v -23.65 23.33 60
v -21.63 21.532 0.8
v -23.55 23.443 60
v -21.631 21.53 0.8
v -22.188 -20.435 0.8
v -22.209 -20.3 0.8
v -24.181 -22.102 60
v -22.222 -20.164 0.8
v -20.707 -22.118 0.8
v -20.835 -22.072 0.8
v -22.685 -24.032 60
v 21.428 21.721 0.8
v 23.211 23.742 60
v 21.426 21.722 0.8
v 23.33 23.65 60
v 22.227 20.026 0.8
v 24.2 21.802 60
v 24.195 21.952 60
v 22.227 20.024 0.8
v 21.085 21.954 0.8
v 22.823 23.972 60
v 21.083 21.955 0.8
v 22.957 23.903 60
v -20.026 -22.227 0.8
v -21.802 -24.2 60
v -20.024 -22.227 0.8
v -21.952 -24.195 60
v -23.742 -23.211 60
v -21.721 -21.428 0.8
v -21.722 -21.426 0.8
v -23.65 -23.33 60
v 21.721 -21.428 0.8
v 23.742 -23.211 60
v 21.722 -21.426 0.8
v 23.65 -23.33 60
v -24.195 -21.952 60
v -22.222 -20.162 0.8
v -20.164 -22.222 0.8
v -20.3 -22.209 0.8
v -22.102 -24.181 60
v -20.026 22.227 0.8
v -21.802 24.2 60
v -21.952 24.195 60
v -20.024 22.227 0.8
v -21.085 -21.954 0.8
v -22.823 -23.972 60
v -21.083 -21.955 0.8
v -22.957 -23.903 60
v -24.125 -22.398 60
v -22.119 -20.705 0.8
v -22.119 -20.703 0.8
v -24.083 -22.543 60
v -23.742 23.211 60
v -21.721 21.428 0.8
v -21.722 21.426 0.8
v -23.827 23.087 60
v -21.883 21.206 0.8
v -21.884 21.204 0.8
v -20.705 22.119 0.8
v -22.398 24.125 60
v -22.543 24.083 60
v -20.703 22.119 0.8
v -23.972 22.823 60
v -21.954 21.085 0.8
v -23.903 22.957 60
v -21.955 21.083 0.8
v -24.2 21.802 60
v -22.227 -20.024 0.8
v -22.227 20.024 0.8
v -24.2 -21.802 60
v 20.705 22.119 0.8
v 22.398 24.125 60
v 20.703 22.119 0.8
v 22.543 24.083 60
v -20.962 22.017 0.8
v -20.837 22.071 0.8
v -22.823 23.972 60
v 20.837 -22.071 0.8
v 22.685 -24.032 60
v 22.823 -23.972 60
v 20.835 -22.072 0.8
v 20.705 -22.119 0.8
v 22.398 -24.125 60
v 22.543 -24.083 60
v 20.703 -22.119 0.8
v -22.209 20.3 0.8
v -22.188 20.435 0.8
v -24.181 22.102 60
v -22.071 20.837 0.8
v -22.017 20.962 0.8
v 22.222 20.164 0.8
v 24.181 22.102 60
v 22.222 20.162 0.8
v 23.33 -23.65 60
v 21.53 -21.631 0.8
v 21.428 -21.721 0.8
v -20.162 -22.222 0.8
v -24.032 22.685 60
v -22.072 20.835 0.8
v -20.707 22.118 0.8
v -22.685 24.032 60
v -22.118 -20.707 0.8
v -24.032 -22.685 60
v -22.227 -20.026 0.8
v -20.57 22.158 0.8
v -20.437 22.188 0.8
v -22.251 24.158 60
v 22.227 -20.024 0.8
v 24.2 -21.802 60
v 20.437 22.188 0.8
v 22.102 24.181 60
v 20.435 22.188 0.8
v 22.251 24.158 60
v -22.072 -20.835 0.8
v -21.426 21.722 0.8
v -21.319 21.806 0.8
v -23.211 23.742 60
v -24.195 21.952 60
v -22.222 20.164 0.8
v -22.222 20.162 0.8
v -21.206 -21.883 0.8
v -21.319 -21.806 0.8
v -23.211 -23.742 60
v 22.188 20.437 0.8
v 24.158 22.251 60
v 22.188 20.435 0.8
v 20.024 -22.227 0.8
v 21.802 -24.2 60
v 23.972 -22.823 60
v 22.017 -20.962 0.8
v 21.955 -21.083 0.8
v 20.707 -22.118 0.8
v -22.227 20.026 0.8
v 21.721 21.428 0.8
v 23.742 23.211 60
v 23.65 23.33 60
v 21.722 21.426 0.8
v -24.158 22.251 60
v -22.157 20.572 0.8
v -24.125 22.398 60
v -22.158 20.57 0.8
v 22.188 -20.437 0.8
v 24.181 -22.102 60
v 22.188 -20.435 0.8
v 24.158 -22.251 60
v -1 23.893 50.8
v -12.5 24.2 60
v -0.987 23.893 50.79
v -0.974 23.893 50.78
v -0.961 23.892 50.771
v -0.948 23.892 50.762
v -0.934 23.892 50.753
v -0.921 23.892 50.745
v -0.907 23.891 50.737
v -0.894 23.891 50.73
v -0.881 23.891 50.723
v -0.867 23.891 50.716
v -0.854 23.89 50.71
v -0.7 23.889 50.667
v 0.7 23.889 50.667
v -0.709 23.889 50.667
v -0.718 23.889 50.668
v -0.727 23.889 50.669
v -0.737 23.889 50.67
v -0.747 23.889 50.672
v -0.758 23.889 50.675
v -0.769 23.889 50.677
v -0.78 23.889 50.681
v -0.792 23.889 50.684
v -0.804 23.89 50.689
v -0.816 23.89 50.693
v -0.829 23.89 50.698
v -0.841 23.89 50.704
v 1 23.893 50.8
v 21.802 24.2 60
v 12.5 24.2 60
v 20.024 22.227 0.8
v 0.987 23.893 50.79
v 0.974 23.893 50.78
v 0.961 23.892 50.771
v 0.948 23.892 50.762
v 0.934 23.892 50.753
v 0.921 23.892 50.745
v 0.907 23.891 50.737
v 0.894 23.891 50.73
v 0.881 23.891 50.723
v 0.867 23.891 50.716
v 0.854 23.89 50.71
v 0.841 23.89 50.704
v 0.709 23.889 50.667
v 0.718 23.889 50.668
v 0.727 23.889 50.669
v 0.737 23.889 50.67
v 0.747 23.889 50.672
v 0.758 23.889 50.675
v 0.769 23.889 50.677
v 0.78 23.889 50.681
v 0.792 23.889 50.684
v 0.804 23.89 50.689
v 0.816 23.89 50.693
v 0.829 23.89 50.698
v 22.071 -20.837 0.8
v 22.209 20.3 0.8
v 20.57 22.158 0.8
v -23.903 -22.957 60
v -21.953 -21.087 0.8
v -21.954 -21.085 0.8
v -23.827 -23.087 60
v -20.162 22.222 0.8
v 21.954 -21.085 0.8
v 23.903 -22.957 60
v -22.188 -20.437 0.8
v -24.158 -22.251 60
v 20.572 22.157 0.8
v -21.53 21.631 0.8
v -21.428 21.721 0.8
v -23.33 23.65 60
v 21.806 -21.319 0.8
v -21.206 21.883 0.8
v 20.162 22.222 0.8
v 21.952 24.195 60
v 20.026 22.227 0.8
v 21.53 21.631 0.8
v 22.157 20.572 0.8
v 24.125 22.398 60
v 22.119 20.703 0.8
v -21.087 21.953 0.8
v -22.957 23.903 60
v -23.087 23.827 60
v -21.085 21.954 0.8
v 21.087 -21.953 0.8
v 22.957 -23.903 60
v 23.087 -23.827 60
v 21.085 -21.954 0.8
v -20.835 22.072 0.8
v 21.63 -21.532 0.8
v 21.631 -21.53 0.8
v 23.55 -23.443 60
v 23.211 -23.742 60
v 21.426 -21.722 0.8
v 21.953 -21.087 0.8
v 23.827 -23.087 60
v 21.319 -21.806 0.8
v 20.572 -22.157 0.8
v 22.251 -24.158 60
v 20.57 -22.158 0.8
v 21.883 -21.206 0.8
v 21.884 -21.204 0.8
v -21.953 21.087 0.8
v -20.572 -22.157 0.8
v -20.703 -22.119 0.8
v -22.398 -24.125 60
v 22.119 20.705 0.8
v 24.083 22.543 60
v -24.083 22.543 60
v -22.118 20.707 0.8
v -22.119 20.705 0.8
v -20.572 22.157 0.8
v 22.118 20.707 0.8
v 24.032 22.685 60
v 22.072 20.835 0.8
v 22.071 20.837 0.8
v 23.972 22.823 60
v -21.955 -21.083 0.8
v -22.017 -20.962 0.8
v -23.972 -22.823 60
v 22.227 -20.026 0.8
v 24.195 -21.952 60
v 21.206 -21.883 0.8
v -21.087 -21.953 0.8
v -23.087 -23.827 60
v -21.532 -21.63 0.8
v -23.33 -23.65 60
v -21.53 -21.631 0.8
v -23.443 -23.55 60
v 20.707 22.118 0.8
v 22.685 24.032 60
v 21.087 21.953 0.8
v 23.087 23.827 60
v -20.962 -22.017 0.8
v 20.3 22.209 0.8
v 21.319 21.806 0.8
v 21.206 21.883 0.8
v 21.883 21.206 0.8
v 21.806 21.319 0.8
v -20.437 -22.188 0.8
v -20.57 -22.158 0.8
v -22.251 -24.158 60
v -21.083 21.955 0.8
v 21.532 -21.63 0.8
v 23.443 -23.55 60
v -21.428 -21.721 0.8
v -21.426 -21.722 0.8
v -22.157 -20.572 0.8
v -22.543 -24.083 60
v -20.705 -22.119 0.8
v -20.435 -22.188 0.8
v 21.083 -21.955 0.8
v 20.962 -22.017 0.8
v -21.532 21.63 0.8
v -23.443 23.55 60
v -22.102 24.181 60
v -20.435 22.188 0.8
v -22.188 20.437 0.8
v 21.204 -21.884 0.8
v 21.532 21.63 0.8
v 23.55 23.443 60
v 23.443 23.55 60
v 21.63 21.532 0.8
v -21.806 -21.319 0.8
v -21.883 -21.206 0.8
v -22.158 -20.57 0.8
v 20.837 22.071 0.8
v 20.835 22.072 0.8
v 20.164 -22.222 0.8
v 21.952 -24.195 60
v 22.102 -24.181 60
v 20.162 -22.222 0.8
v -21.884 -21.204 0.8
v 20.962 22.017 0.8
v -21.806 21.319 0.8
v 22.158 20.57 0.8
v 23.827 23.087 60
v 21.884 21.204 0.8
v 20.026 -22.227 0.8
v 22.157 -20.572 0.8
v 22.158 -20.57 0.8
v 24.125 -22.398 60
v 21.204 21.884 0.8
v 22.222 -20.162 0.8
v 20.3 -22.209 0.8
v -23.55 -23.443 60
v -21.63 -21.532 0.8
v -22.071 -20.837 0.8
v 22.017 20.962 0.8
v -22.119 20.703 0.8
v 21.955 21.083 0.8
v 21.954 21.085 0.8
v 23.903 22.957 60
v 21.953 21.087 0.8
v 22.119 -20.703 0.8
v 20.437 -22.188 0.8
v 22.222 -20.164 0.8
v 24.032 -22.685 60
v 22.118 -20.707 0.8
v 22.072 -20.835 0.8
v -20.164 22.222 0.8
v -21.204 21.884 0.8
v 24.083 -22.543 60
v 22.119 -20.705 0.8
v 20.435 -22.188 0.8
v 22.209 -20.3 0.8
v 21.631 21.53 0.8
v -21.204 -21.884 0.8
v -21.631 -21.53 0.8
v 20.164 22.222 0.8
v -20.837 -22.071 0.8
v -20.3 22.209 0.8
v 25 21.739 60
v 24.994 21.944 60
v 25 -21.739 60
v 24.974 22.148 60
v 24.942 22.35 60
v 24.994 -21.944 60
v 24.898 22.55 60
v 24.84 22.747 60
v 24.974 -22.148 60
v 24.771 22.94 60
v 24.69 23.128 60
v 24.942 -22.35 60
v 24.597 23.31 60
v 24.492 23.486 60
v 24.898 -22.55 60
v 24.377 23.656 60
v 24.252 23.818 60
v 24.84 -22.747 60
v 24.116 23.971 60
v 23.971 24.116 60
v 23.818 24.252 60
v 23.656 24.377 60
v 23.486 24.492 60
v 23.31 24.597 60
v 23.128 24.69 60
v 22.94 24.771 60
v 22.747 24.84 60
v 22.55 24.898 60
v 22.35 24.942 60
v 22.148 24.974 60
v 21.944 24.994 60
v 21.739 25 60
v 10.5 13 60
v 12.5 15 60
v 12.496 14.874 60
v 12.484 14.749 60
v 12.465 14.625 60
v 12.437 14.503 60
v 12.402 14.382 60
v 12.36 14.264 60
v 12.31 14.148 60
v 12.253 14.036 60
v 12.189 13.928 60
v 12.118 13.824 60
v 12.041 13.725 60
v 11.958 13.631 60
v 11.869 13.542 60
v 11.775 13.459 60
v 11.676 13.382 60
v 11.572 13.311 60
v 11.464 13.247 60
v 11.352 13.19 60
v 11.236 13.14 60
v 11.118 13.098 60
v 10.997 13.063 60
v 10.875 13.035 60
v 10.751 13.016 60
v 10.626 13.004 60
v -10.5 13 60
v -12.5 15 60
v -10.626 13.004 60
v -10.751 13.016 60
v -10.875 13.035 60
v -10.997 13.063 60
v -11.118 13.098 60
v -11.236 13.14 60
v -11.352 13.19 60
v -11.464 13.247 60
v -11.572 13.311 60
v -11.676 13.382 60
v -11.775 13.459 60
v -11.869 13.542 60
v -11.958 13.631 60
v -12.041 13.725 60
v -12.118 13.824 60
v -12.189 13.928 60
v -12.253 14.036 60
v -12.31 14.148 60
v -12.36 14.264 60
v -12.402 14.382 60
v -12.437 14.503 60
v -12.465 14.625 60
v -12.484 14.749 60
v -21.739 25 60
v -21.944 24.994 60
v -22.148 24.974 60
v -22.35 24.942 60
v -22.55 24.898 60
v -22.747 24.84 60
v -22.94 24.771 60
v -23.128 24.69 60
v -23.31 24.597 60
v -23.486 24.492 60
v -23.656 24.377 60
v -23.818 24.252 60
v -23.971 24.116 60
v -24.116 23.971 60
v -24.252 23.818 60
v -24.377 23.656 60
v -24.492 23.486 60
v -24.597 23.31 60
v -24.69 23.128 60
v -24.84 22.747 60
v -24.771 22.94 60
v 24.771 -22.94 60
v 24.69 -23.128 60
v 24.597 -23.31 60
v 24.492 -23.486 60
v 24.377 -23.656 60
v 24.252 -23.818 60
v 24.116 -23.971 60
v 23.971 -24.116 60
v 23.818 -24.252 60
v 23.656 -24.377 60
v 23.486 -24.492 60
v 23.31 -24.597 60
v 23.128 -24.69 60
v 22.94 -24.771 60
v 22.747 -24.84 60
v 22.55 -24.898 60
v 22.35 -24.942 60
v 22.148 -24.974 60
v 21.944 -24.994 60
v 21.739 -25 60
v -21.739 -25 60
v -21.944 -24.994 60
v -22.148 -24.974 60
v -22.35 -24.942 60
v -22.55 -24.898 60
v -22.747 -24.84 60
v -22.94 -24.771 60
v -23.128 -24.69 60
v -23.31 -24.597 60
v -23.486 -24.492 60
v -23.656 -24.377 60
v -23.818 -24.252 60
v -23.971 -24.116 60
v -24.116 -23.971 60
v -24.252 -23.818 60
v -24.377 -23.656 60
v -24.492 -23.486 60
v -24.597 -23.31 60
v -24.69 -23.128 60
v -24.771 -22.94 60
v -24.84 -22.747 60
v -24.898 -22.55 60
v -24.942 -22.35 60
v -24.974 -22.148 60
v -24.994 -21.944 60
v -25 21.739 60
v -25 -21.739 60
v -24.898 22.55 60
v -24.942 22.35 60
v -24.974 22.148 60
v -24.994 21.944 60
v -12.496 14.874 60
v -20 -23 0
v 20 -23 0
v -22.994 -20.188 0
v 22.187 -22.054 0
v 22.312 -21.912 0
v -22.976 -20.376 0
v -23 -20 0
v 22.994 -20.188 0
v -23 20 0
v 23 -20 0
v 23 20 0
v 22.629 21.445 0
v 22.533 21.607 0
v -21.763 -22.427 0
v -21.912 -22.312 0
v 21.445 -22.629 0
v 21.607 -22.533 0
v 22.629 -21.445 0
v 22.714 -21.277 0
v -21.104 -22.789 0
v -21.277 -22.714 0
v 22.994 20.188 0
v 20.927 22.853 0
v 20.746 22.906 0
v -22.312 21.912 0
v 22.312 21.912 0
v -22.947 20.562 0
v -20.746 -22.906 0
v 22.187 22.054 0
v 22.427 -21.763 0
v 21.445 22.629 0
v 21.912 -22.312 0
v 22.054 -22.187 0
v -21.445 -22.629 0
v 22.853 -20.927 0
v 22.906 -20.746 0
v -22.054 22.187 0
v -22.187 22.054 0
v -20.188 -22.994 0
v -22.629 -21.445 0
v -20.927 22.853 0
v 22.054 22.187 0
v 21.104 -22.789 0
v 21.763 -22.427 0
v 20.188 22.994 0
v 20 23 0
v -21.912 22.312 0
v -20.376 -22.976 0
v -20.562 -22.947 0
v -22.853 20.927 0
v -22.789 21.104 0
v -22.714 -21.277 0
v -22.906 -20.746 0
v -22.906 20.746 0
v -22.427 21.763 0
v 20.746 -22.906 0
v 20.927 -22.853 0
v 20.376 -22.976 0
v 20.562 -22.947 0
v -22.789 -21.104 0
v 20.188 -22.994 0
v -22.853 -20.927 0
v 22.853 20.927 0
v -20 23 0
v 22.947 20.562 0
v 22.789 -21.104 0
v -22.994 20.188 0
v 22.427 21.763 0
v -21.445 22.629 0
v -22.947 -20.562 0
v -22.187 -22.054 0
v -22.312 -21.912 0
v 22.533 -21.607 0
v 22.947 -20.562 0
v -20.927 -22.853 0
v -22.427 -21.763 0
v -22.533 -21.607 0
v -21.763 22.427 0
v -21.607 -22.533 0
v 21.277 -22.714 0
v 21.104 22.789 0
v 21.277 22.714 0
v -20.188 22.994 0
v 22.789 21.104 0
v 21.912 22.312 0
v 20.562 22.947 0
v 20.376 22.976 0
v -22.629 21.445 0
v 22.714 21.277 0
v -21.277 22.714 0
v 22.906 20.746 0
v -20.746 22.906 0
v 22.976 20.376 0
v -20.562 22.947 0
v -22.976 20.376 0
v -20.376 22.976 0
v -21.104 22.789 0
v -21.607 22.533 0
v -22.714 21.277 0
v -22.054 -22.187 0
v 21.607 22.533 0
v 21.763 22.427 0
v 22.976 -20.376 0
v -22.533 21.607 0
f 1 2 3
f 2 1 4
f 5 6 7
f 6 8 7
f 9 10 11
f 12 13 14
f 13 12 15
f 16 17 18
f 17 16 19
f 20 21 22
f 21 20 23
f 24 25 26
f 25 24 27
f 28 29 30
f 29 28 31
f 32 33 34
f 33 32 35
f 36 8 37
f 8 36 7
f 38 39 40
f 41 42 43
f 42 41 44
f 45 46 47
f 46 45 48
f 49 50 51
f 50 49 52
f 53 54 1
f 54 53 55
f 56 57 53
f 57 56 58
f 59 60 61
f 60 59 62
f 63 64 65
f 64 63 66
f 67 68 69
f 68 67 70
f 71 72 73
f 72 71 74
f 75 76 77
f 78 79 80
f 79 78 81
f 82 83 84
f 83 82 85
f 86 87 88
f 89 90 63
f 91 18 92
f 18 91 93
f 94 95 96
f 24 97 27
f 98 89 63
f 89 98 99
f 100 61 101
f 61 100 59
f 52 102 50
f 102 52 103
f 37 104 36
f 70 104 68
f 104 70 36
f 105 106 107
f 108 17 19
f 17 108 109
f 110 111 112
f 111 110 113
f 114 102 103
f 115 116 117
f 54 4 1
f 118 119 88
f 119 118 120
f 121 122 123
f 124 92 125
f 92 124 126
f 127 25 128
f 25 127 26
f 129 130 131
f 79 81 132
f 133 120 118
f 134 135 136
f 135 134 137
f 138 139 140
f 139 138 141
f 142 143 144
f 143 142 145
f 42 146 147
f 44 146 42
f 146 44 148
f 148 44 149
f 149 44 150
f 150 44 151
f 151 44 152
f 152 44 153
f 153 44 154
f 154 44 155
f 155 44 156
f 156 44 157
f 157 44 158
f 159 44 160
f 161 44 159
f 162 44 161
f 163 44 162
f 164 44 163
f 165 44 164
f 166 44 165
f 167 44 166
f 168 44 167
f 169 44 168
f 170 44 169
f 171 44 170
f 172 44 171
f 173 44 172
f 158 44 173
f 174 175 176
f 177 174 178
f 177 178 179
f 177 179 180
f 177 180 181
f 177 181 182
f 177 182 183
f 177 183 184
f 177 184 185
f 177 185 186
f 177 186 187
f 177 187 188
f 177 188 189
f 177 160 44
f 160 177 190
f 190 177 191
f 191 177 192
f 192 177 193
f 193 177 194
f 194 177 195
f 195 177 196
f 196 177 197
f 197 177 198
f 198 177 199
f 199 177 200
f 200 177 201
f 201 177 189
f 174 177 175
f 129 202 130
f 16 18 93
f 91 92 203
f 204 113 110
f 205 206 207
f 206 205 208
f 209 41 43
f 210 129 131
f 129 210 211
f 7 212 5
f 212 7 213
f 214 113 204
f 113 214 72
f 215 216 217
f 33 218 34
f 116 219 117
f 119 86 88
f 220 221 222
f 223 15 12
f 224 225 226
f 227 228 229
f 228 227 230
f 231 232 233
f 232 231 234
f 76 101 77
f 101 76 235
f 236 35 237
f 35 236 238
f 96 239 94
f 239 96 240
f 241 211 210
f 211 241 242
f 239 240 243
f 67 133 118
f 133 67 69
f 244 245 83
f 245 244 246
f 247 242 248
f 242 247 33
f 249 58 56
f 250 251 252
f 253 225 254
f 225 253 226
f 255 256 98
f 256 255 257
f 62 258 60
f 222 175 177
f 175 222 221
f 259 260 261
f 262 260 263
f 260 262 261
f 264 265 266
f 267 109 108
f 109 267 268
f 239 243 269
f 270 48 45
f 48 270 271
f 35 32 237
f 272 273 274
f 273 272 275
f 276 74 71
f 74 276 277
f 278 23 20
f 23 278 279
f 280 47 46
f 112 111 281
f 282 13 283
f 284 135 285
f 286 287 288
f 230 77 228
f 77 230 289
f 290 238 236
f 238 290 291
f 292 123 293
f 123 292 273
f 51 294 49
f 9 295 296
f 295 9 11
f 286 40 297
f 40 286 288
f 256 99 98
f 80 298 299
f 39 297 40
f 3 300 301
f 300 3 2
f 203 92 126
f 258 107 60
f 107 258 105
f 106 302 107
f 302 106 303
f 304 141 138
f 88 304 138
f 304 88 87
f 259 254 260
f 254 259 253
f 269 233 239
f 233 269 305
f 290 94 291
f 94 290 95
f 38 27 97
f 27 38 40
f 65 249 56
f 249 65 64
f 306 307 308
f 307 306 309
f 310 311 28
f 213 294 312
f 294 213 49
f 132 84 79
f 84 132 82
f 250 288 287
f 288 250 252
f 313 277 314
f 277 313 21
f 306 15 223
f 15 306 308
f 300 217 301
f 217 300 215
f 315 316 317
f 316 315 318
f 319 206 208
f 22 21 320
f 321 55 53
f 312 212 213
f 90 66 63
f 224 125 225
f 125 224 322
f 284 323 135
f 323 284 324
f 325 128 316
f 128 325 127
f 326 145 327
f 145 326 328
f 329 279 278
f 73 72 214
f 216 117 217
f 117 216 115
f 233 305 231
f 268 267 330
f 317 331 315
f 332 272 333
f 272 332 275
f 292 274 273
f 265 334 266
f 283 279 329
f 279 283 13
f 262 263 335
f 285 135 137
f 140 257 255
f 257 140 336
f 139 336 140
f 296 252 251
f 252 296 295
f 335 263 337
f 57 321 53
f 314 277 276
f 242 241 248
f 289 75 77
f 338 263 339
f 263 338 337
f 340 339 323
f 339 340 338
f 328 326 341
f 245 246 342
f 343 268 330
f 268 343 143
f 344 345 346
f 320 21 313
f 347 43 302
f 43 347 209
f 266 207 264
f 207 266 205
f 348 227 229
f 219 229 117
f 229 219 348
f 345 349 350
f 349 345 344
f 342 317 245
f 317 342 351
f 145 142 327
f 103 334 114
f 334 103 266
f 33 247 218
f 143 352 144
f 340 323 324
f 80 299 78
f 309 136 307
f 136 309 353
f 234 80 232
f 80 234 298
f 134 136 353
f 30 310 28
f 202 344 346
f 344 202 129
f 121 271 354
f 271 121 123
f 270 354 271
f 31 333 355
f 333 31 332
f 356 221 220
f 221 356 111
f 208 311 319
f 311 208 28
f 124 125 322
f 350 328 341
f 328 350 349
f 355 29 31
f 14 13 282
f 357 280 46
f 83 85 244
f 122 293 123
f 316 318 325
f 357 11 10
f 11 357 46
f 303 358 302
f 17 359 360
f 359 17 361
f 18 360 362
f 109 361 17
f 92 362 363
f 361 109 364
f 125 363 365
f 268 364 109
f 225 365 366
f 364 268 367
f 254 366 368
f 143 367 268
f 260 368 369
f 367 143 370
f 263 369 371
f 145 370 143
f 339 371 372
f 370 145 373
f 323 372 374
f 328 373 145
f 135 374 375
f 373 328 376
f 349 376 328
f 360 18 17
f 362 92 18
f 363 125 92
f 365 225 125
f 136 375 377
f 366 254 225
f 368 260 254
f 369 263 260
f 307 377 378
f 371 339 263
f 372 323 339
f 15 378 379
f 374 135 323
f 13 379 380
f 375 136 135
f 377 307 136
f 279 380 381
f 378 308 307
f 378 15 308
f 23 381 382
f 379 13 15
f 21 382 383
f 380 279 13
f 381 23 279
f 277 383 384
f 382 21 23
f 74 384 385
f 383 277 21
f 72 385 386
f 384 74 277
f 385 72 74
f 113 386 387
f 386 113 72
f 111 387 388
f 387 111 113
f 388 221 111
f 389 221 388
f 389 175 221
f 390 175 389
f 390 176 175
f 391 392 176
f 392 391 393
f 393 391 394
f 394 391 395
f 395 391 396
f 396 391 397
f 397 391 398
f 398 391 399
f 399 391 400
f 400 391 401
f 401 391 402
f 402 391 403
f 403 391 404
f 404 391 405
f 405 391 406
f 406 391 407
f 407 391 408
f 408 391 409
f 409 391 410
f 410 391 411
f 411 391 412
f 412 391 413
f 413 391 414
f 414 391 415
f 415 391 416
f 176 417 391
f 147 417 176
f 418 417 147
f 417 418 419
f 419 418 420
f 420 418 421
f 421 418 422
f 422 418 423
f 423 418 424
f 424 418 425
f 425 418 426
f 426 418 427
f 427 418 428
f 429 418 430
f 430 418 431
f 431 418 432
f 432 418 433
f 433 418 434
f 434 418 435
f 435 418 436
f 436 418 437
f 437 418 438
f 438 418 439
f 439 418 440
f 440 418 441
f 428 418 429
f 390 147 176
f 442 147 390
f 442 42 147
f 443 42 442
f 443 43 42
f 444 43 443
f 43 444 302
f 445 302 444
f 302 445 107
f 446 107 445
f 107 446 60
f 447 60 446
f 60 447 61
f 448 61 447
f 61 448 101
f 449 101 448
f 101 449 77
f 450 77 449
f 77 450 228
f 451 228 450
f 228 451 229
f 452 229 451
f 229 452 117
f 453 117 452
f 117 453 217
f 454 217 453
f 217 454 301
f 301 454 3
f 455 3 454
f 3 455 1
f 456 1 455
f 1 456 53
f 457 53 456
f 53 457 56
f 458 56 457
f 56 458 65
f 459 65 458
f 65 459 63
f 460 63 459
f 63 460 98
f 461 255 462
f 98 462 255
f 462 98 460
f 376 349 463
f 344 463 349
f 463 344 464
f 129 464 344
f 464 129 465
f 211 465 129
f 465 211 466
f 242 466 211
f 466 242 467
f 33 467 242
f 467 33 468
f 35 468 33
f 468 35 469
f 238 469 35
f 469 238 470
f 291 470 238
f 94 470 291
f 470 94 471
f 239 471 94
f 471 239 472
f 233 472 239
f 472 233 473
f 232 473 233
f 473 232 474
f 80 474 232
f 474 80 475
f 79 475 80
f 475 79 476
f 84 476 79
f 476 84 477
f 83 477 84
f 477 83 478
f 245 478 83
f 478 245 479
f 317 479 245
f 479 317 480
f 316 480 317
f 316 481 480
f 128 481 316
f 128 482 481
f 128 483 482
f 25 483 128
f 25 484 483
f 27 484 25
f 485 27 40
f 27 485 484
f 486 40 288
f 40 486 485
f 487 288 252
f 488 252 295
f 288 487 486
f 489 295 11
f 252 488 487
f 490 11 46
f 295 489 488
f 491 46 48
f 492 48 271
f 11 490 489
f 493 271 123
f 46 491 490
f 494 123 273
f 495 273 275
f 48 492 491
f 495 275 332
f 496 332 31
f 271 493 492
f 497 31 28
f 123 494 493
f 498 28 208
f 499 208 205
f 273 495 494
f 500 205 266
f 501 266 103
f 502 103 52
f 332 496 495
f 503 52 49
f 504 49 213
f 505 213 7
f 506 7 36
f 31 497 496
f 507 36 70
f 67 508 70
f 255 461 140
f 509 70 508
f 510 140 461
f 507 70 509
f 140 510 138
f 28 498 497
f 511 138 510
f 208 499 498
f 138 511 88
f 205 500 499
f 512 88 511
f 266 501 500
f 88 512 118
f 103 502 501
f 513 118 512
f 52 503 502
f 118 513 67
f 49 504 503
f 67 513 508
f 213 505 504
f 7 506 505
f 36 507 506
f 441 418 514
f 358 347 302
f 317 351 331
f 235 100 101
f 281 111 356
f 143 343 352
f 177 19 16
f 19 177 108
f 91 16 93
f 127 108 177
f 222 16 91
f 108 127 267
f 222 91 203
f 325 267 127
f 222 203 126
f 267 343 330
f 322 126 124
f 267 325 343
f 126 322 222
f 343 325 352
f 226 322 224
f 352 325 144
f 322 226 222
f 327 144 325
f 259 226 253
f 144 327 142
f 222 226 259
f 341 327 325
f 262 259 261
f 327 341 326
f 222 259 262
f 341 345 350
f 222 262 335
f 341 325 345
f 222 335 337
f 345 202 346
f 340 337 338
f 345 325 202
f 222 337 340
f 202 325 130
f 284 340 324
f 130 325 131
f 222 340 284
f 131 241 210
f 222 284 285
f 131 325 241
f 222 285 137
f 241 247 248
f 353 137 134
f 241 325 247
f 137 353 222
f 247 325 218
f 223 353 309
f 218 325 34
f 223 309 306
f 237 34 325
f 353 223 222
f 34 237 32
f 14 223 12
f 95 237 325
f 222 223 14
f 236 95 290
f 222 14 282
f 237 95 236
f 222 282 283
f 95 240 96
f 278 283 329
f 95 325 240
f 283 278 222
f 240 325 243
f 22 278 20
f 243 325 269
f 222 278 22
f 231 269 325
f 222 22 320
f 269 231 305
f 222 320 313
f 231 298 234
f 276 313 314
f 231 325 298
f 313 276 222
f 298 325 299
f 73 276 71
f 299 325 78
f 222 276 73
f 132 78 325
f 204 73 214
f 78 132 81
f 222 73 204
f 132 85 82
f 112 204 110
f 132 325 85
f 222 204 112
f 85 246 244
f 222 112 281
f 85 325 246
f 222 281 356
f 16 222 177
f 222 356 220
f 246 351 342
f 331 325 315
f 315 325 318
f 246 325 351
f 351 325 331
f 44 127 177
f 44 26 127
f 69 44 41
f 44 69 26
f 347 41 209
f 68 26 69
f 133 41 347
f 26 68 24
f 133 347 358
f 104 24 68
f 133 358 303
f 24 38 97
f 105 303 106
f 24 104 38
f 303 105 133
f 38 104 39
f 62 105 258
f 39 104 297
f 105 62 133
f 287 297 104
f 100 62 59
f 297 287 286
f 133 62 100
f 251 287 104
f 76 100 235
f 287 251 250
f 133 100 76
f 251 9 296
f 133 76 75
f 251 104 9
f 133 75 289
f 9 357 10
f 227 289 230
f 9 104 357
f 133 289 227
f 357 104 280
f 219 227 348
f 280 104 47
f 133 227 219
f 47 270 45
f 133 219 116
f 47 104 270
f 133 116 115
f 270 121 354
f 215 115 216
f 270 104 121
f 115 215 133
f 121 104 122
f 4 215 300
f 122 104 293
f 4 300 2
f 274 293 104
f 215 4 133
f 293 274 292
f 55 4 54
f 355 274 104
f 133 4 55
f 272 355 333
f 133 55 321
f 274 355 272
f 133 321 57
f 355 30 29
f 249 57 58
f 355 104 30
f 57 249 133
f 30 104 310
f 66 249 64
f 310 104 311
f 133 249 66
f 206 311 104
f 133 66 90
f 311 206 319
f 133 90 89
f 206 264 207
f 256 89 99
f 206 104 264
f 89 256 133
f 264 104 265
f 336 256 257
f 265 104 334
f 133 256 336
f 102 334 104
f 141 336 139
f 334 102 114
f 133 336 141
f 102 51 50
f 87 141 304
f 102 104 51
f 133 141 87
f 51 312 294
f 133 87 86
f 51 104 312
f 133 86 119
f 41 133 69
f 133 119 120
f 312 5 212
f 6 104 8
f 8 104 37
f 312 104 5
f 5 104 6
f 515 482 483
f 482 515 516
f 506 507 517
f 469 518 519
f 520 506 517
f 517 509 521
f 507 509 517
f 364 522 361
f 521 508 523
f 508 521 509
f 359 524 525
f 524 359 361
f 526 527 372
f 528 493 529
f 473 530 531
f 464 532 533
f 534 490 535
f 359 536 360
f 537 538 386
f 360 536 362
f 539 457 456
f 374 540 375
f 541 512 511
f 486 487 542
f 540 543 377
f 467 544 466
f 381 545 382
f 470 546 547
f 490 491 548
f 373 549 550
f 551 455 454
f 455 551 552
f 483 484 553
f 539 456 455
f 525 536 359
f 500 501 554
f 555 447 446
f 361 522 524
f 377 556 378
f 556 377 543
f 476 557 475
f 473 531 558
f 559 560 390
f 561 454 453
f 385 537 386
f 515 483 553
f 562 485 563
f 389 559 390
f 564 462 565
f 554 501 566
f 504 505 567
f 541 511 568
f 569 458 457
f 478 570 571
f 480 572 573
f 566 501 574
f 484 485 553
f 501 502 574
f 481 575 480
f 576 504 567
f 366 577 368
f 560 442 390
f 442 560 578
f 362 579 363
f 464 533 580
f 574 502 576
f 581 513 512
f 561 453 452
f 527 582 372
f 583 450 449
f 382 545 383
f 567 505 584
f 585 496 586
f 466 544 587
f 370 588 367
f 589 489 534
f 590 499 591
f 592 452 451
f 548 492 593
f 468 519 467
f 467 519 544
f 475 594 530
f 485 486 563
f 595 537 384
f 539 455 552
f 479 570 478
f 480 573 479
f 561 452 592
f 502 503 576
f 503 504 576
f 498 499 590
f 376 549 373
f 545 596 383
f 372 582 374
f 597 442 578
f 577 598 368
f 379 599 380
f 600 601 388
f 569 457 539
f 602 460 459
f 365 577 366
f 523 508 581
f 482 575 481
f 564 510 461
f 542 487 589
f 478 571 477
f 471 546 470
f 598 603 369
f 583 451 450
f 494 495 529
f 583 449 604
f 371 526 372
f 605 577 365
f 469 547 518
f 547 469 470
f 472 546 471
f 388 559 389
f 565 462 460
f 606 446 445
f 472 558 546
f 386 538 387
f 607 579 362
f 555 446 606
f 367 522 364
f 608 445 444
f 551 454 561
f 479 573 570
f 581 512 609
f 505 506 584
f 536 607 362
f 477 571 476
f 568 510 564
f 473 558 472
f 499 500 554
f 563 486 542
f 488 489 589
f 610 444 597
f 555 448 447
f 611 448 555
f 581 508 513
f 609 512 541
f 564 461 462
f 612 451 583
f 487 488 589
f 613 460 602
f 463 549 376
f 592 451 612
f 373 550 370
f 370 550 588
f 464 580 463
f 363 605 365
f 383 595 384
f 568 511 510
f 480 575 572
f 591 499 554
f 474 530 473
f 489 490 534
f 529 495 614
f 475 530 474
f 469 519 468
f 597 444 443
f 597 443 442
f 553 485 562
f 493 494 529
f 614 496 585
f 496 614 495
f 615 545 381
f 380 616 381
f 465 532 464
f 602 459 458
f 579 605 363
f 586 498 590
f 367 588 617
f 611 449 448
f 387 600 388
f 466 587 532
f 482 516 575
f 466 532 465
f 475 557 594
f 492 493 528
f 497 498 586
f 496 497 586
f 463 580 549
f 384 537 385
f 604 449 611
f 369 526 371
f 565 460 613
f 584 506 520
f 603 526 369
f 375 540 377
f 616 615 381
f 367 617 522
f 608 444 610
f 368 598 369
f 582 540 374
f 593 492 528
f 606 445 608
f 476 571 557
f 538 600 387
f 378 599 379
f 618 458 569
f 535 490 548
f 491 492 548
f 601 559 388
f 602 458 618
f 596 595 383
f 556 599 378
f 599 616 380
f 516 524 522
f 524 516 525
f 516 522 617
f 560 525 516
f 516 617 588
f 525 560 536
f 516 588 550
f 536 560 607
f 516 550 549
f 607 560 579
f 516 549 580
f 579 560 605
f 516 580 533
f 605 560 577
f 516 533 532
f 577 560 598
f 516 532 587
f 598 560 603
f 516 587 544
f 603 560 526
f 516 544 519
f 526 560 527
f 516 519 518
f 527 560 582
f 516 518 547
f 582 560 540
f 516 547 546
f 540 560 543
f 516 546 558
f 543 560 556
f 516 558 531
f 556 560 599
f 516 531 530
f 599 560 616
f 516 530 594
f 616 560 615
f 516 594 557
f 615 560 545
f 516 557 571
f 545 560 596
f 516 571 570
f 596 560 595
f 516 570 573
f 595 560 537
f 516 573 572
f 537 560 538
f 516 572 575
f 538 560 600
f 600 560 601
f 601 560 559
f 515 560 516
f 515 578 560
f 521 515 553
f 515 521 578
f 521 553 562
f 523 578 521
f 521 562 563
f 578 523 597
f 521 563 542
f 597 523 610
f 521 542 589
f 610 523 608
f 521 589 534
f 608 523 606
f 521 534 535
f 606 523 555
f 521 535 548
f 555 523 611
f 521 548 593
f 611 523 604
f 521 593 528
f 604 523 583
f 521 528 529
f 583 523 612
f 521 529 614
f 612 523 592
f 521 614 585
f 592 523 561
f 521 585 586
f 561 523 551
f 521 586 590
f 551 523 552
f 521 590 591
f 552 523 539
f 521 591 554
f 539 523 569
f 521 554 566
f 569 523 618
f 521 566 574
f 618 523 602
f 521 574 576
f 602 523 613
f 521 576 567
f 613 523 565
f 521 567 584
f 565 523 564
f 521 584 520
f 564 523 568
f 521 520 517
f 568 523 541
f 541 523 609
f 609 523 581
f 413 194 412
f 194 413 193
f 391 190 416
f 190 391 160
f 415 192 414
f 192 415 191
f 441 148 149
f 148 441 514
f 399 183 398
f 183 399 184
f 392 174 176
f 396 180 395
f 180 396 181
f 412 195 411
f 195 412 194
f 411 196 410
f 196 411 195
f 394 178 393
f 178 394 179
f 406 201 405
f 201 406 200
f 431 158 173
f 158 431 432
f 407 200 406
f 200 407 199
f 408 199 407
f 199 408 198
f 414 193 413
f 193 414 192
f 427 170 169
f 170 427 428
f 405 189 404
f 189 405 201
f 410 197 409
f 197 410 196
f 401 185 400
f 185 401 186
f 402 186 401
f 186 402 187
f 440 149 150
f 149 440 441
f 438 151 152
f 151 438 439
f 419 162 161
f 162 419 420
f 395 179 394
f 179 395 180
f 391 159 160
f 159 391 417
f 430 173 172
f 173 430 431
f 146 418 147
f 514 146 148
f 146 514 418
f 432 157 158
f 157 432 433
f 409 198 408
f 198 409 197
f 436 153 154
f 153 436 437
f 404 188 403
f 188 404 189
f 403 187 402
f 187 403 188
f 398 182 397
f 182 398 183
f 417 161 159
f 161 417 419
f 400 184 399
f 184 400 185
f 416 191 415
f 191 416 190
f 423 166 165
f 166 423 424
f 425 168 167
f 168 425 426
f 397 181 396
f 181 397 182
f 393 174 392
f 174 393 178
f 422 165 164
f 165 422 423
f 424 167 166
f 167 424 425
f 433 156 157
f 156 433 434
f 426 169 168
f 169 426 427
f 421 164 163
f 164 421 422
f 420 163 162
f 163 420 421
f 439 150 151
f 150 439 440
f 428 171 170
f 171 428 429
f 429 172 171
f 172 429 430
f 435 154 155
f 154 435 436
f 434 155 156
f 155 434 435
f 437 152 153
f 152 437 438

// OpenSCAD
$fn=100;

width = 50;
depth = 50;
height = 60;
inset = 2;

bottom = 1.6;
wall = 0.8;

edge_radius = 3;

module basedrawing(width, depth, edge_radius) {
    hull() {
        translate([width / 2- edge_radius, depth  / 2- edge_radius,0]) circle(r=edge_radius);
        translate([-width / 2 + edge_radius, depth  / 2- edge_radius,0]) circle(r=edge_radius);
        translate([width / 2- edge_radius, -depth  / 2 + edge_radius,0]) circle(r=edge_radius);
        translate([-width / 2 + edge_radius, -depth  / 2 + edge_radius,0]) circle(r=edge_radius);
    }
}

module bottom(width, depth, inset, edge_radius) {    
    basedrawing(width - 2 * inset, depth - 2 * inset, edge_radius);
}


module base(width, depth, inset, edge_radius) {
     linear_extrude(height=height, scale=[width / (width - 2 * inset),depth / (depth- 2 * inset)]) {
         bottom(width, depth, inset, edge_radius);
     }
}

module sign_holder() {
    sign_depth = 12;
    sign_width = 25;
    sign_radius = 2;
    sign_height = 10;
    
    offset = inset / height * sign_height;
    
    translate([0, depth / 2, height]) rotate([0, 180, 180]) translate([0, offset]) linear_extrude(height=10, scale=[0,0]) translate([0,-offset]) {
        hull() {
                translate([-sign_width / 2 + sign_radius, sign_depth-sign_radius]) circle(r=sign_radius);
                translate([sign_width / 2 - sign_radius, sign_depth-sign_radius]) circle(r=sign_radius);
                translate([-sign_width / 2, 0]) square([sign_width, sign_depth - sign_radius]);
        }
   }
}


module container() {
    difference() {
        base(width, depth, inset, edge_radius);
        difference() {
            base(width - 2 * wall, depth - 2 * wall, inset, edge_radius - wall);
            cube([width, depth, bottom], true);
        }
    }
}

union() {
    container();
    sign_holder();
}
